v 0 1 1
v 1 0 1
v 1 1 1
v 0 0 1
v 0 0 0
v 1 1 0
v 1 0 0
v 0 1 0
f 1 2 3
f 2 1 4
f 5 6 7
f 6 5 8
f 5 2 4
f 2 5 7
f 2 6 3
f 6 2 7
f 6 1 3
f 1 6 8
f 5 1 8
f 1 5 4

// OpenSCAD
x = 10;
y = 20;
echo("Variables:", x, y);
echo("Sum:", x + y);

list = [1, 2, 3, 4, 5];
echo("List:", list);

result = [for (i=[0:5]) if (i % 2 == 0) i];
echo("Even numbers:", result);

cube(1);
